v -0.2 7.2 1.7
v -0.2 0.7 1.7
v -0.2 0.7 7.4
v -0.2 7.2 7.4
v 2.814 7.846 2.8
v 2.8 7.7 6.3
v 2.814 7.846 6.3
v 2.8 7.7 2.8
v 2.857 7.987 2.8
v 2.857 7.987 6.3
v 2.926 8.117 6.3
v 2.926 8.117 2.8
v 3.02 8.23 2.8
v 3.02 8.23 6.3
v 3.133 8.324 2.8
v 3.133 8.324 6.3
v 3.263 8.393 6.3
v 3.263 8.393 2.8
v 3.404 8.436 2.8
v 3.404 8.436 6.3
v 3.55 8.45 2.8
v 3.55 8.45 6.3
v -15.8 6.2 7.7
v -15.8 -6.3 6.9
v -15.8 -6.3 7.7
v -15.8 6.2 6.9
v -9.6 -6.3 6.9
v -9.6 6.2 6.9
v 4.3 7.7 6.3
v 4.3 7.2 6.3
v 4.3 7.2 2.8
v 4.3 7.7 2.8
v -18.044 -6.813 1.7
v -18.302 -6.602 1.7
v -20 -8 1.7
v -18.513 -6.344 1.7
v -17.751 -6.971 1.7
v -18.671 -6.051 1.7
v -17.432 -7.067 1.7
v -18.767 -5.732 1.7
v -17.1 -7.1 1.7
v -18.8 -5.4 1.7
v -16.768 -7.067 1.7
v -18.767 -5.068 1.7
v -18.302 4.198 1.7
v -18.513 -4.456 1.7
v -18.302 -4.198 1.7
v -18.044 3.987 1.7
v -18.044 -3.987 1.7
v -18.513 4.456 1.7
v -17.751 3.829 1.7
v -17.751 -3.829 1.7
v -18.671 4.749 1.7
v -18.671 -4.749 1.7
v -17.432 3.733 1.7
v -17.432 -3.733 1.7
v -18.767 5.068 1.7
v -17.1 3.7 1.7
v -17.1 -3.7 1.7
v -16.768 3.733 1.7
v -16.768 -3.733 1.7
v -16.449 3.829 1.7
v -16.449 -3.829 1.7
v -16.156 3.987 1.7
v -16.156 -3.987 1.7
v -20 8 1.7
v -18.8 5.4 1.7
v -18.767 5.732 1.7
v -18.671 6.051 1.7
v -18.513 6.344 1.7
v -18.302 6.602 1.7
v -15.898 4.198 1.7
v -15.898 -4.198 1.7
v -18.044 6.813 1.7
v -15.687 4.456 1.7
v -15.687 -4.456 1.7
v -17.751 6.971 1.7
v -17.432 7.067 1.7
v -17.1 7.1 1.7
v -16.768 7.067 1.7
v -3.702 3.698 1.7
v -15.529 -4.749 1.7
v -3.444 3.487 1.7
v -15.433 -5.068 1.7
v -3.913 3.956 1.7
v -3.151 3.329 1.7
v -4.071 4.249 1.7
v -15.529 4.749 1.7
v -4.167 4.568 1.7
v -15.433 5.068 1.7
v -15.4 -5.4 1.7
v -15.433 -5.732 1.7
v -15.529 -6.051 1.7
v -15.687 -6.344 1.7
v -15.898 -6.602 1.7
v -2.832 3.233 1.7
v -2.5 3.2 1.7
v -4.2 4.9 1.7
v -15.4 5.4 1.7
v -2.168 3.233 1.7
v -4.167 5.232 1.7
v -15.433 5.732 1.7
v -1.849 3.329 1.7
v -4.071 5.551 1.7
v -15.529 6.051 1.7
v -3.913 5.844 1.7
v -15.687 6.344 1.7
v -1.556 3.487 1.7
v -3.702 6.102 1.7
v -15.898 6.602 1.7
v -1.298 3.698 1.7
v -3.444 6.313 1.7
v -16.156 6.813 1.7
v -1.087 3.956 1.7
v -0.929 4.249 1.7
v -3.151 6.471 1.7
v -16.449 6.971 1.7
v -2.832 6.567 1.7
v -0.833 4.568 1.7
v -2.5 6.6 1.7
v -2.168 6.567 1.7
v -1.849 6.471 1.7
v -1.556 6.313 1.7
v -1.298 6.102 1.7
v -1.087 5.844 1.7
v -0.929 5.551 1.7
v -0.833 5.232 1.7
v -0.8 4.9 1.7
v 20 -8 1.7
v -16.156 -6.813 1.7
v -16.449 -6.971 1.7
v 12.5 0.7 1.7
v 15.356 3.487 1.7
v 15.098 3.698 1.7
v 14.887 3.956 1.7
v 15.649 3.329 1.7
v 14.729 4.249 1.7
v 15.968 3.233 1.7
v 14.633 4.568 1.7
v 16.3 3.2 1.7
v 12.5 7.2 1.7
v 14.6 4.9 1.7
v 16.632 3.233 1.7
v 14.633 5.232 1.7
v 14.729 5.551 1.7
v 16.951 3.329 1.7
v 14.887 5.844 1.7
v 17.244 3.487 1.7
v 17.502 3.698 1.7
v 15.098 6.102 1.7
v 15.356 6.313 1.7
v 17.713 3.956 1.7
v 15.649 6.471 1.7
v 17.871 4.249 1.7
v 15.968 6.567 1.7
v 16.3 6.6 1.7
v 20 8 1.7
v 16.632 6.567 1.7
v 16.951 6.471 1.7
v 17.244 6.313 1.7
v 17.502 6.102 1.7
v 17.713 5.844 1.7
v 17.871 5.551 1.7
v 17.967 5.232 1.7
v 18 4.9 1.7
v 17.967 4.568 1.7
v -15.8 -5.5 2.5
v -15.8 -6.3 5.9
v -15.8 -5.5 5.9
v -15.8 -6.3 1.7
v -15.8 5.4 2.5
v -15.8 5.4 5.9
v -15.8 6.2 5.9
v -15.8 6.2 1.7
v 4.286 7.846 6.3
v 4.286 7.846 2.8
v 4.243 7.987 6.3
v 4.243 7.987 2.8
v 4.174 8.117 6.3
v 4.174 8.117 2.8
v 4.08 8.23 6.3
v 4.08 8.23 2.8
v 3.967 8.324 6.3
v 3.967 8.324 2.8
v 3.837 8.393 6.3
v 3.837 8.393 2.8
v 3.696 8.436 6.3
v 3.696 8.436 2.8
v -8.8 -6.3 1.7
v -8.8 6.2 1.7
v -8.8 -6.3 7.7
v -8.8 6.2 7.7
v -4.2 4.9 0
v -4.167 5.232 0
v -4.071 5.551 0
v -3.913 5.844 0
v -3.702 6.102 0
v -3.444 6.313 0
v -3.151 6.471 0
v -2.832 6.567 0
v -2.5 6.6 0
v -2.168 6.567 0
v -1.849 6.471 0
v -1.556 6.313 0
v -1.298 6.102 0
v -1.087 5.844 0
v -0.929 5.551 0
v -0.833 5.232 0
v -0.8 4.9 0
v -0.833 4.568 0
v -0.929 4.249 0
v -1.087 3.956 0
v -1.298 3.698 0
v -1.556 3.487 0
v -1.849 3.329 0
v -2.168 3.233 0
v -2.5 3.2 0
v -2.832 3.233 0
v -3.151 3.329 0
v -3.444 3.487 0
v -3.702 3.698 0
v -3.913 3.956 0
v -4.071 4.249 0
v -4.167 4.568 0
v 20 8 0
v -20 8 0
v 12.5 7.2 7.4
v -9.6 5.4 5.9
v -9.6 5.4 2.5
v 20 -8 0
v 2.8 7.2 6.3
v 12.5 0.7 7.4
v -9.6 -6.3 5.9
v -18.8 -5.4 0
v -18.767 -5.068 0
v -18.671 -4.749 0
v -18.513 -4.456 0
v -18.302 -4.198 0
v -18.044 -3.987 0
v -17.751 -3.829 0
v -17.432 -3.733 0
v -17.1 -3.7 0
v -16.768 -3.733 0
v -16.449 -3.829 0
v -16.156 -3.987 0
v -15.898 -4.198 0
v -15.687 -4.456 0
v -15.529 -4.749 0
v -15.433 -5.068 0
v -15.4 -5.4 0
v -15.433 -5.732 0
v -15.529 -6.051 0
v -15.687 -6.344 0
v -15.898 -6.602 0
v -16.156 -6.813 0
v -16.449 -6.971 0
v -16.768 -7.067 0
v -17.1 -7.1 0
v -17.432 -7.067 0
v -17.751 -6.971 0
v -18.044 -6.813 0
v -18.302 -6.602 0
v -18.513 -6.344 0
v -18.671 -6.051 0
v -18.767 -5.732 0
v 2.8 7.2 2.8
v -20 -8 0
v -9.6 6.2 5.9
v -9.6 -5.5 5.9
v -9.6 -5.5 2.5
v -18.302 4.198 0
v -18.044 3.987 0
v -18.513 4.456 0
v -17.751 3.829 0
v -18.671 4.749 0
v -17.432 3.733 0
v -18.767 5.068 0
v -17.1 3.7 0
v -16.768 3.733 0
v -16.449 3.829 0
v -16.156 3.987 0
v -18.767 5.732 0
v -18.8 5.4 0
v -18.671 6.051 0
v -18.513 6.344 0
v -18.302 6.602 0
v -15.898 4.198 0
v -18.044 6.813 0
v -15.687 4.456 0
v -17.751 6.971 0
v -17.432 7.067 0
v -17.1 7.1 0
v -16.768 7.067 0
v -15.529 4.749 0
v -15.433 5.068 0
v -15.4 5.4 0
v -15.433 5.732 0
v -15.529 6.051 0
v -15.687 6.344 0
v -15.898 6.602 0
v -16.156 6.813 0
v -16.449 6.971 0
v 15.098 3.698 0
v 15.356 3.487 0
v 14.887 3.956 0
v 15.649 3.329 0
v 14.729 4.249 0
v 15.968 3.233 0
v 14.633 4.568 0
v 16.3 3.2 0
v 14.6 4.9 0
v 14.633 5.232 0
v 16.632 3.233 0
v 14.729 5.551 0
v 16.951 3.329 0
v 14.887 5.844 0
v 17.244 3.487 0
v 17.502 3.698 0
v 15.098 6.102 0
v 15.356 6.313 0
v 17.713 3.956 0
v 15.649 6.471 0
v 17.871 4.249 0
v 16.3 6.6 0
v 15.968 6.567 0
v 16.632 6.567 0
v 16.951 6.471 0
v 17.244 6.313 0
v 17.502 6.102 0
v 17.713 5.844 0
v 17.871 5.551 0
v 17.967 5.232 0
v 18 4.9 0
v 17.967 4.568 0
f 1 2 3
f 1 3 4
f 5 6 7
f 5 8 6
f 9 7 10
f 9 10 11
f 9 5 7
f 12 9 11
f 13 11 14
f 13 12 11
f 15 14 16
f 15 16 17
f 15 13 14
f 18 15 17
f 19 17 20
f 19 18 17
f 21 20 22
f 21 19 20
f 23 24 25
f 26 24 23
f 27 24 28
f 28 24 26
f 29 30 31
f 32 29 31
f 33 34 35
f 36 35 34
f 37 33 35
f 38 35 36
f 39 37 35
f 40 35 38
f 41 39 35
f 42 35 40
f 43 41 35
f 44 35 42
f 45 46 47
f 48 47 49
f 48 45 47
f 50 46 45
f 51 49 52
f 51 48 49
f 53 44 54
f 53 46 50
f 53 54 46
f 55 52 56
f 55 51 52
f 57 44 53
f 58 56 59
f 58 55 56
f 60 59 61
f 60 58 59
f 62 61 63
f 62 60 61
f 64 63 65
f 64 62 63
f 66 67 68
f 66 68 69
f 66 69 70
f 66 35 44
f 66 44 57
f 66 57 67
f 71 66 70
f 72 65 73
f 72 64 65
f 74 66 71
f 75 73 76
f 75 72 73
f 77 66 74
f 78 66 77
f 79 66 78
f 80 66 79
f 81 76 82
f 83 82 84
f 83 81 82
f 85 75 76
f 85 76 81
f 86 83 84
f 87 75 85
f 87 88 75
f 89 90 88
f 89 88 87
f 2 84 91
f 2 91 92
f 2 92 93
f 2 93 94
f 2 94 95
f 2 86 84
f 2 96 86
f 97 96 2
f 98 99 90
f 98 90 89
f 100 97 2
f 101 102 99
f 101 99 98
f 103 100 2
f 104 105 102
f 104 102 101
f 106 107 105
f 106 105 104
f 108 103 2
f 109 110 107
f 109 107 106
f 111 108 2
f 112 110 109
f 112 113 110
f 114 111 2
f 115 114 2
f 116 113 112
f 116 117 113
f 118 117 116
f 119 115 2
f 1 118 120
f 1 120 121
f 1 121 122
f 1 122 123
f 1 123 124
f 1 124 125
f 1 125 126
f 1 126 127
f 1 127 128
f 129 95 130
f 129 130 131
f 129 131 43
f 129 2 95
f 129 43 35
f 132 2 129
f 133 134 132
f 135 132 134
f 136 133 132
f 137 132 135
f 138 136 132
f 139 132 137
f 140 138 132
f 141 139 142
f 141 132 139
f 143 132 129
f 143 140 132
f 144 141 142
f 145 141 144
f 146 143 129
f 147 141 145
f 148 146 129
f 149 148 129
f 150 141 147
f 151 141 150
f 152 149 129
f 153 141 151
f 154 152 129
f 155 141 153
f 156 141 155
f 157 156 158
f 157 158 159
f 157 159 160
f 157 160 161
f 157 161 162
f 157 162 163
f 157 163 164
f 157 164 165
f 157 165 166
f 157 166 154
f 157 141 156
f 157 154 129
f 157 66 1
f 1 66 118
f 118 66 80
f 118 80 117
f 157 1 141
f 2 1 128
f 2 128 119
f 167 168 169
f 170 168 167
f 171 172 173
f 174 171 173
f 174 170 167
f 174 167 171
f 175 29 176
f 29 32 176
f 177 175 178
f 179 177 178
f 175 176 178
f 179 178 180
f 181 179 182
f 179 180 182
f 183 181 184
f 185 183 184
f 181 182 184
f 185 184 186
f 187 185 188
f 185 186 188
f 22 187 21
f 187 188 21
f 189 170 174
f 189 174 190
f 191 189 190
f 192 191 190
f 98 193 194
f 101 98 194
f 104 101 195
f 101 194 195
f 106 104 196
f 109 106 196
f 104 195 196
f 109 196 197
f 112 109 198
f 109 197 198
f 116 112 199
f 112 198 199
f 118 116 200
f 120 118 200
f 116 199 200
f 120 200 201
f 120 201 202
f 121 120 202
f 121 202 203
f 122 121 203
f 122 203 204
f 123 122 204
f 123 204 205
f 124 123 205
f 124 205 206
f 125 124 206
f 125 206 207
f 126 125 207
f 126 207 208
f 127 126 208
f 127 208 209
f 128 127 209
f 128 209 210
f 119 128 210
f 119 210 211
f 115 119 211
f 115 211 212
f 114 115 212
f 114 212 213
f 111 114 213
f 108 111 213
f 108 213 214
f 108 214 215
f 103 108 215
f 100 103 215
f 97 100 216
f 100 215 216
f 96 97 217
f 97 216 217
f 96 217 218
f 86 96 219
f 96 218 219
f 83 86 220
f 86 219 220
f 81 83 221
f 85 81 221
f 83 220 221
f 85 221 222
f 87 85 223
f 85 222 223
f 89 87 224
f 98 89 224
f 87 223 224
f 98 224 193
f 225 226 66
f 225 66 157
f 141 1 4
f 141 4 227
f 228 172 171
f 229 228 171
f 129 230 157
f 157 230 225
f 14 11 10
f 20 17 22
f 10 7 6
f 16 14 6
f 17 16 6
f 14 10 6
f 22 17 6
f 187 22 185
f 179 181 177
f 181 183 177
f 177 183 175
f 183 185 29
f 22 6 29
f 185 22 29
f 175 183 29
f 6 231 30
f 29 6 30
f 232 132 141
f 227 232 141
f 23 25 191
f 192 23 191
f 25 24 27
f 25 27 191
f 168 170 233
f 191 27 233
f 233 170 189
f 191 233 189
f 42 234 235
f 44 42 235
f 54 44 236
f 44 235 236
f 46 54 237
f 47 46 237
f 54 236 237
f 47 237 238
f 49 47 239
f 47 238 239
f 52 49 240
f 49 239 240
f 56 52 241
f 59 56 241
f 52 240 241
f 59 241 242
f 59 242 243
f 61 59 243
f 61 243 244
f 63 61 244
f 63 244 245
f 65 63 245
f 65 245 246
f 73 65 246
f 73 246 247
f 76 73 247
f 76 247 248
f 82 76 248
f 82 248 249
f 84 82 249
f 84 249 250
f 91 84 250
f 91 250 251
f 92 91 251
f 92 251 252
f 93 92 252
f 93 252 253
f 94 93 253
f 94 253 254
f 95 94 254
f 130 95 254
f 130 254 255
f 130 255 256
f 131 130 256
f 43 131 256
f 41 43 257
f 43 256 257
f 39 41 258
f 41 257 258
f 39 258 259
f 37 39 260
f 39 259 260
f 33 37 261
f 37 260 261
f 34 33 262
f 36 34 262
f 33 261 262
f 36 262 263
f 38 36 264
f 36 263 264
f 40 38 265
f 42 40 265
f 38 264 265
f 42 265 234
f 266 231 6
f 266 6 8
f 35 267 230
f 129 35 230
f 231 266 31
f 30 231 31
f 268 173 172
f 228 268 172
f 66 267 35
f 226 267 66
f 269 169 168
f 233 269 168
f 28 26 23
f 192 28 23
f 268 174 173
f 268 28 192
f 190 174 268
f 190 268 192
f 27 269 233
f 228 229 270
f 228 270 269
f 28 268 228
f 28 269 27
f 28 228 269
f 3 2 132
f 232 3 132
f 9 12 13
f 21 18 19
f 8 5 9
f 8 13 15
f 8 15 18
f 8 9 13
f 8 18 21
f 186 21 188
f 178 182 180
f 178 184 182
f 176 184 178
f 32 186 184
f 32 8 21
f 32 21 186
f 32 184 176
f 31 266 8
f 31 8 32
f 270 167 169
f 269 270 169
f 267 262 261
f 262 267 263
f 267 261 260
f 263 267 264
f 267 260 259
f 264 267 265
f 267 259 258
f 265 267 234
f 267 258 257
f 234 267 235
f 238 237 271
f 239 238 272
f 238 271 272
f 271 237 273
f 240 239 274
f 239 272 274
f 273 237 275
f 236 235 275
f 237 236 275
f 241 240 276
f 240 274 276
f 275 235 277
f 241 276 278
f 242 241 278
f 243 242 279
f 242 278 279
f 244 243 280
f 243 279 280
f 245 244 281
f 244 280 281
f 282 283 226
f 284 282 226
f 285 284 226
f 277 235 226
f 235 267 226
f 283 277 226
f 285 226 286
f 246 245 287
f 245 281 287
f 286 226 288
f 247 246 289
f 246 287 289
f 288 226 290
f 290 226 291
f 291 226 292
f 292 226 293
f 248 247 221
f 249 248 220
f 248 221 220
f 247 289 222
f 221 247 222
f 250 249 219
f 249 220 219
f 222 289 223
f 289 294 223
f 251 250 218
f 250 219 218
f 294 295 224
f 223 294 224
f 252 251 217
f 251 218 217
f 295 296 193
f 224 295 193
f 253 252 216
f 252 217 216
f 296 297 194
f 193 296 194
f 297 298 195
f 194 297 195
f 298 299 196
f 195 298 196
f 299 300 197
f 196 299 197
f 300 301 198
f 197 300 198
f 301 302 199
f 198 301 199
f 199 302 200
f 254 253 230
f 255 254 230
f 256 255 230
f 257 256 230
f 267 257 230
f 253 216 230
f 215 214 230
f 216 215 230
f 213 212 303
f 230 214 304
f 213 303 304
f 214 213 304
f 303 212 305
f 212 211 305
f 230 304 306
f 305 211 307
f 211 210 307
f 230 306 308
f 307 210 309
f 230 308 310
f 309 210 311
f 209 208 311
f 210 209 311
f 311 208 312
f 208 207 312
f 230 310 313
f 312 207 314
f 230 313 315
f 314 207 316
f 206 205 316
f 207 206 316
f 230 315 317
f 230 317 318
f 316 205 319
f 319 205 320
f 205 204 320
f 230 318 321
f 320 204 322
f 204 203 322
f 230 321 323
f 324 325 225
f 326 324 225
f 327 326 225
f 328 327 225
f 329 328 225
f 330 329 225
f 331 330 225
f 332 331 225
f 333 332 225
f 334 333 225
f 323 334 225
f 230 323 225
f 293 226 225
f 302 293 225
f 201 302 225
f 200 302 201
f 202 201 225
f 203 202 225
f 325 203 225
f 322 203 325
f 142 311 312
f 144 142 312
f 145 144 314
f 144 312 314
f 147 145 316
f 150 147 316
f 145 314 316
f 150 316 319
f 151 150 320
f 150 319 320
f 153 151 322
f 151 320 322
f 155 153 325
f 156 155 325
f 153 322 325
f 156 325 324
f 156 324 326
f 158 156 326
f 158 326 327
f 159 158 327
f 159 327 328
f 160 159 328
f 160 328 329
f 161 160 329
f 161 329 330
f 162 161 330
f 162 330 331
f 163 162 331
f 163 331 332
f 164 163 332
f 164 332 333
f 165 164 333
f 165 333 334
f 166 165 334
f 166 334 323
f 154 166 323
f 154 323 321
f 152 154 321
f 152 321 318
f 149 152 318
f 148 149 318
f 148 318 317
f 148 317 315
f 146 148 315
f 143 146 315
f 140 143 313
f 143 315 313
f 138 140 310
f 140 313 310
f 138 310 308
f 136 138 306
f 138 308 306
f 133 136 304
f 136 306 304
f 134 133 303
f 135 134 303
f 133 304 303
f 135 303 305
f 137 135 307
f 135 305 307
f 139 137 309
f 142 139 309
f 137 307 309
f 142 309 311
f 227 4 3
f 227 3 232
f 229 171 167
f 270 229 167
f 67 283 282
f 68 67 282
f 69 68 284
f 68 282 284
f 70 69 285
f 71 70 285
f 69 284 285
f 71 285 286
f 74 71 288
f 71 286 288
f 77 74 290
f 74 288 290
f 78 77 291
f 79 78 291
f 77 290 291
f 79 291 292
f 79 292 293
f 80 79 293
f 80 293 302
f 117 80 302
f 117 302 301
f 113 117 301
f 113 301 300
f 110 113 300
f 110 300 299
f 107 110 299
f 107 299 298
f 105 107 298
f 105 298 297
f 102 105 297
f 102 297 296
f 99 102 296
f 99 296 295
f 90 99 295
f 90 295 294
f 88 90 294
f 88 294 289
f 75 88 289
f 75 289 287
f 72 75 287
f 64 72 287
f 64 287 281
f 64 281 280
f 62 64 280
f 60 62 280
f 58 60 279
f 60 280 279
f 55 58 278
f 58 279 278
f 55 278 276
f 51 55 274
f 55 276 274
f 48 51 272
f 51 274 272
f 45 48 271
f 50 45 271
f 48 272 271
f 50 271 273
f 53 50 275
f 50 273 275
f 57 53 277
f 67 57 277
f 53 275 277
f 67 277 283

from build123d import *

# Parameters (mm, degrees)
SKETCH1_W            = 40
SKETCH1_H            = 16
BOSS_EXTRUDE1_DEPTH  = 1.7
M3_CLEARANCE_HOLE1_D = 3.4
SKETCH5_W            = 12.7
SKETCH5_H            = 6.5
BOSS_EXTRUDE2_DEPTH  = 5.7
SKETCH6_W            = 1.5
SKETCH6_H            = 3.5
BOSS_EXTRUDE3_DEPTH  = 1.25
FILLET1_R            = 0.75
SKETCH7_W            = 7
SKETCH7_H            = 12.5
BOSS_EXTRUDE4_DEPTH  = 6
CUT_EXTRUDE1_DEPTH   = 6.2


with BuildPart() as part:
    # Sketch1 → Boss-Extrude1 (new body)
    with BuildSketch(Plane.XY):
        Rectangle(SKETCH1_W, SKETCH1_H)
    extrude(amount=BOSS_EXTRUDE1_DEPTH)

    # M3 Clearance Hole1 (through all)
    with Locations(Plane.XY.offset(1.7)):
        with Locations((-17.1, -5.4), (-2.5, 4.9), (16.3, 4.9), (-17.1, 5.4)):
            Hole(M3_CLEARANCE_HOLE1_D / 2)

    # Sketch5 → Boss-Extrude2 (add)
    with BuildSketch(Plane.XY.offset(1.7)):
        with Locations((6.15, 3.95)):
            Rectangle(SKETCH5_W, SKETCH5_H)
    extrude(amount=BOSS_EXTRUDE2_DEPTH)


with BuildPart() as body_2:
    # Sketch6 → Boss-Extrude3 (new body)
    with BuildSketch(Plane(origin=(0, 7.2, 0), x_dir=(1, 0, 0), z_dir=(0, 1, 0))):
        with Locations((3.55, -4.55)):
            Rectangle(SKETCH6_W, SKETCH6_H)
    extrude(amount=BOSS_EXTRUDE3_DEPTH)

    # Fillet1
    fillet1_edges = [body_2.edges().sort_by_distance(p)[0] for p in [
        (4.3, 8.45, 4.55),
        (2.8, 8.45, 4.55),
    ]]
    fillet(fillet1_edges, radius=FILLET1_R - 0.0001)  # a hair under: the kernel refuses the full size


with BuildPart() as body_3:
    # Sketch7 → Boss-Extrude4 (new body)
    with BuildSketch(Plane.XY.offset(1.7)):
        with Locations((-12.3, -0.05)):
            Rectangle(SKETCH7_W, SKETCH7_H)
    extrude(amount=BOSS_EXTRUDE4_DEPTH)

    # Sketch8 → Cut-Extrude1 (cut)
    with BuildSketch(Plane.ZY.offset(15.8)):
        Polygon((6.9, 6.2), (5.9, 6.2), (5.9, 5.4), (2.5, 5.4), (2.5, -5.5), (5.9, -5.5), (5.9, -6.3), (6.9, -6.3), align=None)
    extrude(amount=-CUT_EXTRUDE1_DEPTH, mode=Mode.SUBTRACT)


solid = Compound([part.part, body_2.part, body_3.part])
